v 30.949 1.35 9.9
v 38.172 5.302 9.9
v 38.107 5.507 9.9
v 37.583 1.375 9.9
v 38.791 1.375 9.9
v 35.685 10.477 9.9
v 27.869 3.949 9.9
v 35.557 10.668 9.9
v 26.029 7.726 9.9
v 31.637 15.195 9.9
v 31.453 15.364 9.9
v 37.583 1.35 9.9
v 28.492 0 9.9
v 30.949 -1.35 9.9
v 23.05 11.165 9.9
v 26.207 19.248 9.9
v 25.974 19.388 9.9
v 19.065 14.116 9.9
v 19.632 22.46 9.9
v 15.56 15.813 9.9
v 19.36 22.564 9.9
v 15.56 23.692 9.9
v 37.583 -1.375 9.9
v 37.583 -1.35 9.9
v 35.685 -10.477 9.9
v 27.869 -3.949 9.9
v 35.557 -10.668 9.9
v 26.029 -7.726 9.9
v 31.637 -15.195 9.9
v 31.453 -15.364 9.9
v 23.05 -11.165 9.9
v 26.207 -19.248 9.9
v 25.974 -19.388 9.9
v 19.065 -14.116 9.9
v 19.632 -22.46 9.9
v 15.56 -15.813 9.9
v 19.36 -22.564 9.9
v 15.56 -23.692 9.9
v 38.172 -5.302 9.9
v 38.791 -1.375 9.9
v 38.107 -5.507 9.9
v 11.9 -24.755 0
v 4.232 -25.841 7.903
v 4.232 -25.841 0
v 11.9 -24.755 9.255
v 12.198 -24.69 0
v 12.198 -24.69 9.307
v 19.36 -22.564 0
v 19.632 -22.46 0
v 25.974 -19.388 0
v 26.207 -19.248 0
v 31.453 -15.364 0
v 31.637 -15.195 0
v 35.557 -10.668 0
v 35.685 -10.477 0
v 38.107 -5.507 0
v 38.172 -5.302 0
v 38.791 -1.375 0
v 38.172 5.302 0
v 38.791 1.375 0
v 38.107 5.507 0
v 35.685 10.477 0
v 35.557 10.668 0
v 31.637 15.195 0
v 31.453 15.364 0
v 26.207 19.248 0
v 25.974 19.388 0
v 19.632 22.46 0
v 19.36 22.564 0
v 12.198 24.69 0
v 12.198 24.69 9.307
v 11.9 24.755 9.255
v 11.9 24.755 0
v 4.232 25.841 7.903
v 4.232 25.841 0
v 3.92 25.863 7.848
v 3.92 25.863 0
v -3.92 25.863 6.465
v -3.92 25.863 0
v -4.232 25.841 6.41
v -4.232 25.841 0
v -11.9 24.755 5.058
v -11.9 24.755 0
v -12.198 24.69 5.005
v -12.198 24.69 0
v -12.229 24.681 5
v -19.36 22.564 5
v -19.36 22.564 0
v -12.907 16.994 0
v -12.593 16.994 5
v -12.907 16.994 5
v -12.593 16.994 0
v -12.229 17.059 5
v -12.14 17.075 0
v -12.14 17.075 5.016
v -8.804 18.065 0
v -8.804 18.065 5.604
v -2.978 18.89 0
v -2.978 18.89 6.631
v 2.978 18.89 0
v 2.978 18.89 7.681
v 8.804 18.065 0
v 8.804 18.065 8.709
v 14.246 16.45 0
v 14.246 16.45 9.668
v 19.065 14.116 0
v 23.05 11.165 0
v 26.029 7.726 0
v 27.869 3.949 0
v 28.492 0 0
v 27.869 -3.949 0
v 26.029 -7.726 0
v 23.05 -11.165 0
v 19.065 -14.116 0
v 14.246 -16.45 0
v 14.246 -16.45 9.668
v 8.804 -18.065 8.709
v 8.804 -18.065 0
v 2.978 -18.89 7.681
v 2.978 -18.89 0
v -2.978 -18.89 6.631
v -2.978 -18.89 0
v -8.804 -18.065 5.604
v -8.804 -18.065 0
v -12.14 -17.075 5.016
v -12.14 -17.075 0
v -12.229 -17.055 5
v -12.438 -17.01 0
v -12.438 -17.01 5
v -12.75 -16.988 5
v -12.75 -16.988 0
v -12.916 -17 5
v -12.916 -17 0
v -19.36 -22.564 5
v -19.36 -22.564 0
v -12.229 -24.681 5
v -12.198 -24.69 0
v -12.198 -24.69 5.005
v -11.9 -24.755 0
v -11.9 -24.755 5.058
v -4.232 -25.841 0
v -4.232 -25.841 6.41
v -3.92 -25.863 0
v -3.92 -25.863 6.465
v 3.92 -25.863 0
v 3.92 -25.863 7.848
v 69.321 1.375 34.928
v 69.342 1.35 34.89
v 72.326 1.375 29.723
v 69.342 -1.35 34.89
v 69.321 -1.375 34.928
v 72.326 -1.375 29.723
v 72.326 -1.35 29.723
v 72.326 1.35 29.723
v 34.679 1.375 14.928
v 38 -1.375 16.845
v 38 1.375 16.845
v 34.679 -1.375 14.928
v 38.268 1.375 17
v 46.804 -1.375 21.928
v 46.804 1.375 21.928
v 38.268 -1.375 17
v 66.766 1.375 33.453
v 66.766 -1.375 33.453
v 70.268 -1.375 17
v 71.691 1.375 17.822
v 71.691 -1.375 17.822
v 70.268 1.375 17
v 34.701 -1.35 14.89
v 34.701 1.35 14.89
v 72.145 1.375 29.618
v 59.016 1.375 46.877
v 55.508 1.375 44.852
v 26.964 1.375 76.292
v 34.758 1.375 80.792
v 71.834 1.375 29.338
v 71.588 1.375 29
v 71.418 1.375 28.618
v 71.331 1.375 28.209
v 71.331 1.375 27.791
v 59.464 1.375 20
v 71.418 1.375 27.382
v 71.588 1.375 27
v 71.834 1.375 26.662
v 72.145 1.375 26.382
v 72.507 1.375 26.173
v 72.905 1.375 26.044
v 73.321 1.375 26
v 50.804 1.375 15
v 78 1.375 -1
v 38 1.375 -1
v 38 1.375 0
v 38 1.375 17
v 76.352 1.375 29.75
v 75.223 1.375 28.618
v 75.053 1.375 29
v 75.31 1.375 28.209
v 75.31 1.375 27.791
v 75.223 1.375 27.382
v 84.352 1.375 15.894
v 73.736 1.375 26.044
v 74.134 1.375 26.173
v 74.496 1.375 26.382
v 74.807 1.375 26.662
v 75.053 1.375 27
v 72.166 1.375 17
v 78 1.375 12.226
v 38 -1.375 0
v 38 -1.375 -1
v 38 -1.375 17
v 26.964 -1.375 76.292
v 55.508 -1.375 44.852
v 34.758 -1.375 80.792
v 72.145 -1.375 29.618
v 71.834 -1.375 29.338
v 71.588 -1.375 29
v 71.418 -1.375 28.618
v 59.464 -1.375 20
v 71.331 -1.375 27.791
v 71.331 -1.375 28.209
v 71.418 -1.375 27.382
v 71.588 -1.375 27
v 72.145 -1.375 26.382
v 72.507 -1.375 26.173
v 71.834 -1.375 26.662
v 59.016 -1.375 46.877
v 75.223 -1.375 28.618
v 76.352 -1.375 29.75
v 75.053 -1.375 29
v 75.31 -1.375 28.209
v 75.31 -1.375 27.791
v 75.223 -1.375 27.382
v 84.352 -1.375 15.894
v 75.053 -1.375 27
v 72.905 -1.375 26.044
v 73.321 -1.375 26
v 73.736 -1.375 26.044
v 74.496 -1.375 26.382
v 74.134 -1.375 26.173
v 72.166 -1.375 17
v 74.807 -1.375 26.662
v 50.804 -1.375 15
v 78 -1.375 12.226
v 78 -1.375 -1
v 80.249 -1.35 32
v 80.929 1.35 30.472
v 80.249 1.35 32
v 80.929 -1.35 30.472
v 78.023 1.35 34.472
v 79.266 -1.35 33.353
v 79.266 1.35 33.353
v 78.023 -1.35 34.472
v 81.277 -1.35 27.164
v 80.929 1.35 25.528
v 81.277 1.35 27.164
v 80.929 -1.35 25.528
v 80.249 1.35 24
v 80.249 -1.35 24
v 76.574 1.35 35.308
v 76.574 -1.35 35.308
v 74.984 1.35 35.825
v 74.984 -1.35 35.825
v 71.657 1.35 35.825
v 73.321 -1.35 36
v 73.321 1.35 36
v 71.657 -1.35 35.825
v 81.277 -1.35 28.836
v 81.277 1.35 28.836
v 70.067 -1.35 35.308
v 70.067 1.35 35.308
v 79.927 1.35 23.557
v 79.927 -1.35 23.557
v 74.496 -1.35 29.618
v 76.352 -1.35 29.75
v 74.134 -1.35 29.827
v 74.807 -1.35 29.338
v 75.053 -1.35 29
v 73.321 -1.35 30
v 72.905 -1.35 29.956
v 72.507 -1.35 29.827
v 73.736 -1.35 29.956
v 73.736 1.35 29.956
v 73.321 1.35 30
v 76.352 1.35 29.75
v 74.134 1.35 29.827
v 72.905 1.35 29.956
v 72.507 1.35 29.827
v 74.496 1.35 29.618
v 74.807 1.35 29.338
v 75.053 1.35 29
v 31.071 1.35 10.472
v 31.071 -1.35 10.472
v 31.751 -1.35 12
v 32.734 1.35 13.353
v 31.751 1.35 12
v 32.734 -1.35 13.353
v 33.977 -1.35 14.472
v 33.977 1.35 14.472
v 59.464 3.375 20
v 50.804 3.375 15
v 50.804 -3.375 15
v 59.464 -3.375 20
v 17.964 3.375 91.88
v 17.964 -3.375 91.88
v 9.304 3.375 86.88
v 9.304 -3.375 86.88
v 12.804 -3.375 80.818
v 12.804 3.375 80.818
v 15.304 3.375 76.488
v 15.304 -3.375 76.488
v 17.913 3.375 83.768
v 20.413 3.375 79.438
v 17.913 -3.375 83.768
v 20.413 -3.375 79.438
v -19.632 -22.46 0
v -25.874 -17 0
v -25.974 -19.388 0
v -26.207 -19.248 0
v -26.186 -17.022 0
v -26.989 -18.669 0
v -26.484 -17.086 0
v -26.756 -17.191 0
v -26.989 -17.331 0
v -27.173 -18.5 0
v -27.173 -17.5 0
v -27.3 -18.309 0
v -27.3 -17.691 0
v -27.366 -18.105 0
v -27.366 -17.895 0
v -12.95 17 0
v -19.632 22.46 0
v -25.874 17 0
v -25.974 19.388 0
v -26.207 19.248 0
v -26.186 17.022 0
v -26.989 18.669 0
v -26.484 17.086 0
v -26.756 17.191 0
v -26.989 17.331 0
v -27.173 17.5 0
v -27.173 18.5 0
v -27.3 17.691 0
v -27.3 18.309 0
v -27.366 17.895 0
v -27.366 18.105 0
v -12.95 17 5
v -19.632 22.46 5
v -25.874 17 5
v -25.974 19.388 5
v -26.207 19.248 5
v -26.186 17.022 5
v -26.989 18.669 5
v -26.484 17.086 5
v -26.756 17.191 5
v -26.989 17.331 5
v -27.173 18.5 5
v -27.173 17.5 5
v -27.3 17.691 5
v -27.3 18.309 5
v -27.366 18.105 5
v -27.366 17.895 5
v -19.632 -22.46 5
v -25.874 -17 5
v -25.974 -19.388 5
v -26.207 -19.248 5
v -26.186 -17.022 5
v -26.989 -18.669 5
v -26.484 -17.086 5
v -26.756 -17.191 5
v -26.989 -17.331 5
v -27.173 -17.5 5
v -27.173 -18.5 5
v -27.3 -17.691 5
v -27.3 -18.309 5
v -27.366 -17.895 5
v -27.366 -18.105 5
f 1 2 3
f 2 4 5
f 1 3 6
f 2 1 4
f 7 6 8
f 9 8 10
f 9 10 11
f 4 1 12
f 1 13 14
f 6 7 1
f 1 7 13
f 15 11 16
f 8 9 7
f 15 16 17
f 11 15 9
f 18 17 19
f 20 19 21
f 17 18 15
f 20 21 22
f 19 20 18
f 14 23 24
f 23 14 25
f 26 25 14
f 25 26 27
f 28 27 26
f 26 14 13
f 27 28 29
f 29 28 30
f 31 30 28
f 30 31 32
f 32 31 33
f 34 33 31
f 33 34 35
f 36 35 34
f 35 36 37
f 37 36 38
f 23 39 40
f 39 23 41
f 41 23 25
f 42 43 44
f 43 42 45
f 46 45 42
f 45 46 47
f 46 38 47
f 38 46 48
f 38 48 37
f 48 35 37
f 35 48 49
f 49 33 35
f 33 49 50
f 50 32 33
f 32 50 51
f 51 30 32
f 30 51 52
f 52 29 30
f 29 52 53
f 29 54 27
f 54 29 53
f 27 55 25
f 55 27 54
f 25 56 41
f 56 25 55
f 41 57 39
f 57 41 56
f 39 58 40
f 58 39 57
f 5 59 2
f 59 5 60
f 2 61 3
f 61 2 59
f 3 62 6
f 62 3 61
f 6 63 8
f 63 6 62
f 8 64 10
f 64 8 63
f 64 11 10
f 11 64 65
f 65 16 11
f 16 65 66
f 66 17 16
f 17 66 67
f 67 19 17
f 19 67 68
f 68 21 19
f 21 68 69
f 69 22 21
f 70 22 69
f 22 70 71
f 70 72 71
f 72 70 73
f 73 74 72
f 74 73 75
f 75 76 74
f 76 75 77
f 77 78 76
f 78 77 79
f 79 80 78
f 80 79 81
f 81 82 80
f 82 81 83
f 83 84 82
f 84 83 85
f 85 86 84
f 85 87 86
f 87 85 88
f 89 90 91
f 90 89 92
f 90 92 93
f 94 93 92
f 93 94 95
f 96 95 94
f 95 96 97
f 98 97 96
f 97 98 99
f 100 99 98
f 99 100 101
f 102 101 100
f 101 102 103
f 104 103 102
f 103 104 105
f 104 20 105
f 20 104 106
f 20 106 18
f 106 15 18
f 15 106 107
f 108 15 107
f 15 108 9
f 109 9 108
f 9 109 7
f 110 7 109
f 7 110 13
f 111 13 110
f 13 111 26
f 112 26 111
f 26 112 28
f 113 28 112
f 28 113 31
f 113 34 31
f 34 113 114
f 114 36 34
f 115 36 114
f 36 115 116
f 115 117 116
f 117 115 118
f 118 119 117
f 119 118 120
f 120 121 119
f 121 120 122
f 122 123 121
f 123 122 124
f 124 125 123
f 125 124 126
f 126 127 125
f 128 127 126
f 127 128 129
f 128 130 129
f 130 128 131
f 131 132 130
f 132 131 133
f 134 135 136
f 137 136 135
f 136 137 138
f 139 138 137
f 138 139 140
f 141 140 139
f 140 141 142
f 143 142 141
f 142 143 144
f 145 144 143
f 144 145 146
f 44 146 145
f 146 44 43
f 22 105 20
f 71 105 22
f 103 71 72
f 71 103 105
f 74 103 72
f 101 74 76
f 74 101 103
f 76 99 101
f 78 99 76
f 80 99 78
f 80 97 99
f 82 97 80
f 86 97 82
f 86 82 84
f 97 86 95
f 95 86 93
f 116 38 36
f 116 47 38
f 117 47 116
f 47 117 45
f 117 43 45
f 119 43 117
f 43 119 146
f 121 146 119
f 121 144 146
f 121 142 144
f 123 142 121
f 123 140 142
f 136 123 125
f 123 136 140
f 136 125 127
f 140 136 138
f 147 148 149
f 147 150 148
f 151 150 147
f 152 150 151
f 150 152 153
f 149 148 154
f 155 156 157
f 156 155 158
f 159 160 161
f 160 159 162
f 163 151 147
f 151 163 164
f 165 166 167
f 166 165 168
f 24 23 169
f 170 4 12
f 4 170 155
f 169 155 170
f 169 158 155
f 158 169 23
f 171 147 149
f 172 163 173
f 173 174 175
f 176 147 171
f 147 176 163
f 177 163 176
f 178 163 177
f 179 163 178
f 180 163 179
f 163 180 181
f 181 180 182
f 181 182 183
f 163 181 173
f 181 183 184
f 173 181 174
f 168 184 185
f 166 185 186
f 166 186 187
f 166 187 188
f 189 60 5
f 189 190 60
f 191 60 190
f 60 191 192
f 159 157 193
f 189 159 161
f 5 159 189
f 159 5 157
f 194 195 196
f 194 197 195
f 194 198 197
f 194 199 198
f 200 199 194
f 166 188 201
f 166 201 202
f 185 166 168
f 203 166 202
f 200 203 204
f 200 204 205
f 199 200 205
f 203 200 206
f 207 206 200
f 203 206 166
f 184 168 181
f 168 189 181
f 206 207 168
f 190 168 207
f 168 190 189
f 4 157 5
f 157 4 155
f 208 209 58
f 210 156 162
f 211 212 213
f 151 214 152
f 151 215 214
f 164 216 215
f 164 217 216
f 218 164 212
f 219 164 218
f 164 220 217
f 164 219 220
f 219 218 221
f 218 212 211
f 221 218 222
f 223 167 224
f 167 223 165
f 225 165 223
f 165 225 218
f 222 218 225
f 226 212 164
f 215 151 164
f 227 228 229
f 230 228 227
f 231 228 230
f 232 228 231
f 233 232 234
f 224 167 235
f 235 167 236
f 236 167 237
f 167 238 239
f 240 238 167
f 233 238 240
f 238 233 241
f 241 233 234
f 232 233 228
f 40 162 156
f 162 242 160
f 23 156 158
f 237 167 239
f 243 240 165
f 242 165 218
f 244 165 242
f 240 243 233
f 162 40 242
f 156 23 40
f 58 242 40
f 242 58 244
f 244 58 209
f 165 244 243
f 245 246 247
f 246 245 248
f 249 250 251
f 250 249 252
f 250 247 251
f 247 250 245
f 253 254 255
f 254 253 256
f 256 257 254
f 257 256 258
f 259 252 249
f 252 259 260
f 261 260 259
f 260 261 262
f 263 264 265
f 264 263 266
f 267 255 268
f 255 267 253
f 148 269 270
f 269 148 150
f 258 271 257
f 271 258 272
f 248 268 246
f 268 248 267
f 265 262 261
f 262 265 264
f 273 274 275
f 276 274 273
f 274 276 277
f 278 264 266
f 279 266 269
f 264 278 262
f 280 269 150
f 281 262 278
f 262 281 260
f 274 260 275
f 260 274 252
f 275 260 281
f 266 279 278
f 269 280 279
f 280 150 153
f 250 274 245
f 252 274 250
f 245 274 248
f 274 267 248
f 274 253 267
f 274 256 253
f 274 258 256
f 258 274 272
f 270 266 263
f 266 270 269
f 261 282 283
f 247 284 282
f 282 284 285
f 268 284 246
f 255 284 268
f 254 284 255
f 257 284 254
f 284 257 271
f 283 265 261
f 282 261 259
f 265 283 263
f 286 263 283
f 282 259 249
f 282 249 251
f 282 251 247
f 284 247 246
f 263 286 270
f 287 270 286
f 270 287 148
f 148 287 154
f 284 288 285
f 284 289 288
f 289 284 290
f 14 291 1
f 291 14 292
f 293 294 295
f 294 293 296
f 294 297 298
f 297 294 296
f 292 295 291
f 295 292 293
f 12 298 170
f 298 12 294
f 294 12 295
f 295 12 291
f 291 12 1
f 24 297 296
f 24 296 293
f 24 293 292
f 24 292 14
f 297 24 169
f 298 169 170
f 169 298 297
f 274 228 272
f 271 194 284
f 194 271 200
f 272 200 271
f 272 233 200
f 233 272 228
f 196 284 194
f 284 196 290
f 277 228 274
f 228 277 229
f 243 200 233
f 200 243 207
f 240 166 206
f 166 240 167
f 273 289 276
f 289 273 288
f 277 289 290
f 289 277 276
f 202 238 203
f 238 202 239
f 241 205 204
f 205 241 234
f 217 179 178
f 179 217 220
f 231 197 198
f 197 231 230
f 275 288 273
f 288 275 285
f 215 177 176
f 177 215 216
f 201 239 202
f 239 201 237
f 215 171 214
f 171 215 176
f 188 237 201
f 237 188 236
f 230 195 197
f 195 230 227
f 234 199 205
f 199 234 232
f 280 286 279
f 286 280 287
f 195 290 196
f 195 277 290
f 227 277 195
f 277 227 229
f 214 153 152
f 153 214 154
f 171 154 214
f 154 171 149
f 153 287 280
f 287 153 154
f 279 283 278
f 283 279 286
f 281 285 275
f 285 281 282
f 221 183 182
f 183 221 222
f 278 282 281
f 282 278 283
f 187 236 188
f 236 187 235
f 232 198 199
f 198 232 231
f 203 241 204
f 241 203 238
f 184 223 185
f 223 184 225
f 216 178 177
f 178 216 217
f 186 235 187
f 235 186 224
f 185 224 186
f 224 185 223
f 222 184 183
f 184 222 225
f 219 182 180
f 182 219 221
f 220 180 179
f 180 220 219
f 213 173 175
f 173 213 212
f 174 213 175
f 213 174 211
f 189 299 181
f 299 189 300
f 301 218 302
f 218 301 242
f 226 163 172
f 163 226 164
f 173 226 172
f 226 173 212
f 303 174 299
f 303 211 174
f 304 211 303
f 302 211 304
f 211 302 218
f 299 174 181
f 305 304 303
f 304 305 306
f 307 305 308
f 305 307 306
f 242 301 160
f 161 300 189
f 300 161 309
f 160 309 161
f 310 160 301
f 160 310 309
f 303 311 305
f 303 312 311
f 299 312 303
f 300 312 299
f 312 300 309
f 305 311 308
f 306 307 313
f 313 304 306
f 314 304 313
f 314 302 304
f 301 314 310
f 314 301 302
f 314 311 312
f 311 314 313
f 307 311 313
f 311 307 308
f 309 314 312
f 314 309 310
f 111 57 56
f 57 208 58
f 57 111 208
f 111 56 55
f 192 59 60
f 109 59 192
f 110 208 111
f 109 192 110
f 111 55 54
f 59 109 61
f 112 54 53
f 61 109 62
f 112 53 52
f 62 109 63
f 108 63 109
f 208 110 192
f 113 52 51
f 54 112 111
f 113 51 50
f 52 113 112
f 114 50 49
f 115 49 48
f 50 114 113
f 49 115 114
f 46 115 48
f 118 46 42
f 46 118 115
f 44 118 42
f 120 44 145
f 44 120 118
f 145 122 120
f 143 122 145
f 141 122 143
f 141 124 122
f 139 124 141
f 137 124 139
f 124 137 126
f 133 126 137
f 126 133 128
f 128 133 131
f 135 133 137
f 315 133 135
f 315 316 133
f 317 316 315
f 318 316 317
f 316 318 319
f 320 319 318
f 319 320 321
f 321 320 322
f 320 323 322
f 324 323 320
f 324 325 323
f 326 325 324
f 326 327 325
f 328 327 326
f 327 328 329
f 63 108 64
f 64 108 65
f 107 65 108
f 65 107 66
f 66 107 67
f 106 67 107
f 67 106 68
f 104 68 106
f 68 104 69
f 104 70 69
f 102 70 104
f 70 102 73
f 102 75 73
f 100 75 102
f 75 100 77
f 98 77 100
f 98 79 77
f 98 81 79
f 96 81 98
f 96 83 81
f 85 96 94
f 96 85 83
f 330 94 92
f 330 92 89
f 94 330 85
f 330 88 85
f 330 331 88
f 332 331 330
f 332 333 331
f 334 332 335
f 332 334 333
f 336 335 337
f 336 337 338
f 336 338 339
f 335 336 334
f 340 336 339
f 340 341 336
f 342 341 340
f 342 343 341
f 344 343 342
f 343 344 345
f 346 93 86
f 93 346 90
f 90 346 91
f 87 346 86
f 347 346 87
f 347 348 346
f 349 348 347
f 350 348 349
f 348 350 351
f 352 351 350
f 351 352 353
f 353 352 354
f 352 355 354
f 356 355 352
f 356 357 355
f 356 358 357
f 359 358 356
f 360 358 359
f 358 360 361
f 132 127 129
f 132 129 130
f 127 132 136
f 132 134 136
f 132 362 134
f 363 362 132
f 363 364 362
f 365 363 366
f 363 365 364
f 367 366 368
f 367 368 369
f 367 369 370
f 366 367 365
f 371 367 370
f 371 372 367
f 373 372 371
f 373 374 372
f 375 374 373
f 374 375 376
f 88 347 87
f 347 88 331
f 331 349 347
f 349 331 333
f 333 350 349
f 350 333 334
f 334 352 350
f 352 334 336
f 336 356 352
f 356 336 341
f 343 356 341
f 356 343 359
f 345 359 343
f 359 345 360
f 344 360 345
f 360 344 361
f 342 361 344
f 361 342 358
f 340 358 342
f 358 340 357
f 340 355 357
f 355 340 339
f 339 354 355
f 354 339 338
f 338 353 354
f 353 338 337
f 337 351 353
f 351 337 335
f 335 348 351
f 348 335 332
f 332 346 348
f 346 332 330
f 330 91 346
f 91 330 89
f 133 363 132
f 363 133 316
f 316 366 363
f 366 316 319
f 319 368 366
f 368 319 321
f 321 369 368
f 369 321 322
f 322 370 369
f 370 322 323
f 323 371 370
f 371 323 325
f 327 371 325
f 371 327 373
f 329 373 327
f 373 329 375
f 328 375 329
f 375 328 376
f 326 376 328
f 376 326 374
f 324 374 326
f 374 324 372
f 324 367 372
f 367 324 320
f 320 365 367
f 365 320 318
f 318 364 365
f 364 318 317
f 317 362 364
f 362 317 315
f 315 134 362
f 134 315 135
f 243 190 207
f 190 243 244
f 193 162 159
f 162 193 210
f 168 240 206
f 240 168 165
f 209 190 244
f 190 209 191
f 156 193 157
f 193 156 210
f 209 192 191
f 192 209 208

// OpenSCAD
$fn=30;
module ring()
{
    linear_extrude(5)
    scale([1.5,1])
    offset(r=1)
    difference()
    {
        circle(25);
        union()
        {
            circle(20);
            translate([-17,0,0])
            square([17,36], center=true);
        }
    }
}

ring();

render(convexity = 2)
translate([0,0,4.9])
difference()
{
    ring();
    translate([-8,0,11])
    rotate([0,80,0])
    cube([20,60,60], center=true);
}

translate([58,0,8])
cube([40,2.75,18],center=true);


translate([56,0,8+sin(30)*20])
rotate([0,-30,0])
union()
{
    difference()
    {
        union()
        {
            cube([40,2.75,16],center=true);
            
            translate([20,0,0])
            rotate([90,0,0])
            cylinder(2.7,d=16,center=true);

            translate([-20,0,0])
            rotate([90,0,0])
            cylinder(2.7,d=16,center=true);
            
            translate([18.5,0,-8])
            cube([10,2.75,16],center=true);

        }

        translate([20,0,0])
            rotate([90,0,0])
                cylinder(3,r=2,center=true);
    }

    translate([8,0,32.5])
    difference()
    {
        union()
        {
            cube([10,2.75,65],center=true);
            translate([7,0,-20])
            cube([4.1,2.75,22],center=true);
            translate([-9,0,9])
            cube([10,6.75,83],center=true);
        }
        translate([-11.1,0,41])
            cube([6,6.8,5],center=true);
    }
}
